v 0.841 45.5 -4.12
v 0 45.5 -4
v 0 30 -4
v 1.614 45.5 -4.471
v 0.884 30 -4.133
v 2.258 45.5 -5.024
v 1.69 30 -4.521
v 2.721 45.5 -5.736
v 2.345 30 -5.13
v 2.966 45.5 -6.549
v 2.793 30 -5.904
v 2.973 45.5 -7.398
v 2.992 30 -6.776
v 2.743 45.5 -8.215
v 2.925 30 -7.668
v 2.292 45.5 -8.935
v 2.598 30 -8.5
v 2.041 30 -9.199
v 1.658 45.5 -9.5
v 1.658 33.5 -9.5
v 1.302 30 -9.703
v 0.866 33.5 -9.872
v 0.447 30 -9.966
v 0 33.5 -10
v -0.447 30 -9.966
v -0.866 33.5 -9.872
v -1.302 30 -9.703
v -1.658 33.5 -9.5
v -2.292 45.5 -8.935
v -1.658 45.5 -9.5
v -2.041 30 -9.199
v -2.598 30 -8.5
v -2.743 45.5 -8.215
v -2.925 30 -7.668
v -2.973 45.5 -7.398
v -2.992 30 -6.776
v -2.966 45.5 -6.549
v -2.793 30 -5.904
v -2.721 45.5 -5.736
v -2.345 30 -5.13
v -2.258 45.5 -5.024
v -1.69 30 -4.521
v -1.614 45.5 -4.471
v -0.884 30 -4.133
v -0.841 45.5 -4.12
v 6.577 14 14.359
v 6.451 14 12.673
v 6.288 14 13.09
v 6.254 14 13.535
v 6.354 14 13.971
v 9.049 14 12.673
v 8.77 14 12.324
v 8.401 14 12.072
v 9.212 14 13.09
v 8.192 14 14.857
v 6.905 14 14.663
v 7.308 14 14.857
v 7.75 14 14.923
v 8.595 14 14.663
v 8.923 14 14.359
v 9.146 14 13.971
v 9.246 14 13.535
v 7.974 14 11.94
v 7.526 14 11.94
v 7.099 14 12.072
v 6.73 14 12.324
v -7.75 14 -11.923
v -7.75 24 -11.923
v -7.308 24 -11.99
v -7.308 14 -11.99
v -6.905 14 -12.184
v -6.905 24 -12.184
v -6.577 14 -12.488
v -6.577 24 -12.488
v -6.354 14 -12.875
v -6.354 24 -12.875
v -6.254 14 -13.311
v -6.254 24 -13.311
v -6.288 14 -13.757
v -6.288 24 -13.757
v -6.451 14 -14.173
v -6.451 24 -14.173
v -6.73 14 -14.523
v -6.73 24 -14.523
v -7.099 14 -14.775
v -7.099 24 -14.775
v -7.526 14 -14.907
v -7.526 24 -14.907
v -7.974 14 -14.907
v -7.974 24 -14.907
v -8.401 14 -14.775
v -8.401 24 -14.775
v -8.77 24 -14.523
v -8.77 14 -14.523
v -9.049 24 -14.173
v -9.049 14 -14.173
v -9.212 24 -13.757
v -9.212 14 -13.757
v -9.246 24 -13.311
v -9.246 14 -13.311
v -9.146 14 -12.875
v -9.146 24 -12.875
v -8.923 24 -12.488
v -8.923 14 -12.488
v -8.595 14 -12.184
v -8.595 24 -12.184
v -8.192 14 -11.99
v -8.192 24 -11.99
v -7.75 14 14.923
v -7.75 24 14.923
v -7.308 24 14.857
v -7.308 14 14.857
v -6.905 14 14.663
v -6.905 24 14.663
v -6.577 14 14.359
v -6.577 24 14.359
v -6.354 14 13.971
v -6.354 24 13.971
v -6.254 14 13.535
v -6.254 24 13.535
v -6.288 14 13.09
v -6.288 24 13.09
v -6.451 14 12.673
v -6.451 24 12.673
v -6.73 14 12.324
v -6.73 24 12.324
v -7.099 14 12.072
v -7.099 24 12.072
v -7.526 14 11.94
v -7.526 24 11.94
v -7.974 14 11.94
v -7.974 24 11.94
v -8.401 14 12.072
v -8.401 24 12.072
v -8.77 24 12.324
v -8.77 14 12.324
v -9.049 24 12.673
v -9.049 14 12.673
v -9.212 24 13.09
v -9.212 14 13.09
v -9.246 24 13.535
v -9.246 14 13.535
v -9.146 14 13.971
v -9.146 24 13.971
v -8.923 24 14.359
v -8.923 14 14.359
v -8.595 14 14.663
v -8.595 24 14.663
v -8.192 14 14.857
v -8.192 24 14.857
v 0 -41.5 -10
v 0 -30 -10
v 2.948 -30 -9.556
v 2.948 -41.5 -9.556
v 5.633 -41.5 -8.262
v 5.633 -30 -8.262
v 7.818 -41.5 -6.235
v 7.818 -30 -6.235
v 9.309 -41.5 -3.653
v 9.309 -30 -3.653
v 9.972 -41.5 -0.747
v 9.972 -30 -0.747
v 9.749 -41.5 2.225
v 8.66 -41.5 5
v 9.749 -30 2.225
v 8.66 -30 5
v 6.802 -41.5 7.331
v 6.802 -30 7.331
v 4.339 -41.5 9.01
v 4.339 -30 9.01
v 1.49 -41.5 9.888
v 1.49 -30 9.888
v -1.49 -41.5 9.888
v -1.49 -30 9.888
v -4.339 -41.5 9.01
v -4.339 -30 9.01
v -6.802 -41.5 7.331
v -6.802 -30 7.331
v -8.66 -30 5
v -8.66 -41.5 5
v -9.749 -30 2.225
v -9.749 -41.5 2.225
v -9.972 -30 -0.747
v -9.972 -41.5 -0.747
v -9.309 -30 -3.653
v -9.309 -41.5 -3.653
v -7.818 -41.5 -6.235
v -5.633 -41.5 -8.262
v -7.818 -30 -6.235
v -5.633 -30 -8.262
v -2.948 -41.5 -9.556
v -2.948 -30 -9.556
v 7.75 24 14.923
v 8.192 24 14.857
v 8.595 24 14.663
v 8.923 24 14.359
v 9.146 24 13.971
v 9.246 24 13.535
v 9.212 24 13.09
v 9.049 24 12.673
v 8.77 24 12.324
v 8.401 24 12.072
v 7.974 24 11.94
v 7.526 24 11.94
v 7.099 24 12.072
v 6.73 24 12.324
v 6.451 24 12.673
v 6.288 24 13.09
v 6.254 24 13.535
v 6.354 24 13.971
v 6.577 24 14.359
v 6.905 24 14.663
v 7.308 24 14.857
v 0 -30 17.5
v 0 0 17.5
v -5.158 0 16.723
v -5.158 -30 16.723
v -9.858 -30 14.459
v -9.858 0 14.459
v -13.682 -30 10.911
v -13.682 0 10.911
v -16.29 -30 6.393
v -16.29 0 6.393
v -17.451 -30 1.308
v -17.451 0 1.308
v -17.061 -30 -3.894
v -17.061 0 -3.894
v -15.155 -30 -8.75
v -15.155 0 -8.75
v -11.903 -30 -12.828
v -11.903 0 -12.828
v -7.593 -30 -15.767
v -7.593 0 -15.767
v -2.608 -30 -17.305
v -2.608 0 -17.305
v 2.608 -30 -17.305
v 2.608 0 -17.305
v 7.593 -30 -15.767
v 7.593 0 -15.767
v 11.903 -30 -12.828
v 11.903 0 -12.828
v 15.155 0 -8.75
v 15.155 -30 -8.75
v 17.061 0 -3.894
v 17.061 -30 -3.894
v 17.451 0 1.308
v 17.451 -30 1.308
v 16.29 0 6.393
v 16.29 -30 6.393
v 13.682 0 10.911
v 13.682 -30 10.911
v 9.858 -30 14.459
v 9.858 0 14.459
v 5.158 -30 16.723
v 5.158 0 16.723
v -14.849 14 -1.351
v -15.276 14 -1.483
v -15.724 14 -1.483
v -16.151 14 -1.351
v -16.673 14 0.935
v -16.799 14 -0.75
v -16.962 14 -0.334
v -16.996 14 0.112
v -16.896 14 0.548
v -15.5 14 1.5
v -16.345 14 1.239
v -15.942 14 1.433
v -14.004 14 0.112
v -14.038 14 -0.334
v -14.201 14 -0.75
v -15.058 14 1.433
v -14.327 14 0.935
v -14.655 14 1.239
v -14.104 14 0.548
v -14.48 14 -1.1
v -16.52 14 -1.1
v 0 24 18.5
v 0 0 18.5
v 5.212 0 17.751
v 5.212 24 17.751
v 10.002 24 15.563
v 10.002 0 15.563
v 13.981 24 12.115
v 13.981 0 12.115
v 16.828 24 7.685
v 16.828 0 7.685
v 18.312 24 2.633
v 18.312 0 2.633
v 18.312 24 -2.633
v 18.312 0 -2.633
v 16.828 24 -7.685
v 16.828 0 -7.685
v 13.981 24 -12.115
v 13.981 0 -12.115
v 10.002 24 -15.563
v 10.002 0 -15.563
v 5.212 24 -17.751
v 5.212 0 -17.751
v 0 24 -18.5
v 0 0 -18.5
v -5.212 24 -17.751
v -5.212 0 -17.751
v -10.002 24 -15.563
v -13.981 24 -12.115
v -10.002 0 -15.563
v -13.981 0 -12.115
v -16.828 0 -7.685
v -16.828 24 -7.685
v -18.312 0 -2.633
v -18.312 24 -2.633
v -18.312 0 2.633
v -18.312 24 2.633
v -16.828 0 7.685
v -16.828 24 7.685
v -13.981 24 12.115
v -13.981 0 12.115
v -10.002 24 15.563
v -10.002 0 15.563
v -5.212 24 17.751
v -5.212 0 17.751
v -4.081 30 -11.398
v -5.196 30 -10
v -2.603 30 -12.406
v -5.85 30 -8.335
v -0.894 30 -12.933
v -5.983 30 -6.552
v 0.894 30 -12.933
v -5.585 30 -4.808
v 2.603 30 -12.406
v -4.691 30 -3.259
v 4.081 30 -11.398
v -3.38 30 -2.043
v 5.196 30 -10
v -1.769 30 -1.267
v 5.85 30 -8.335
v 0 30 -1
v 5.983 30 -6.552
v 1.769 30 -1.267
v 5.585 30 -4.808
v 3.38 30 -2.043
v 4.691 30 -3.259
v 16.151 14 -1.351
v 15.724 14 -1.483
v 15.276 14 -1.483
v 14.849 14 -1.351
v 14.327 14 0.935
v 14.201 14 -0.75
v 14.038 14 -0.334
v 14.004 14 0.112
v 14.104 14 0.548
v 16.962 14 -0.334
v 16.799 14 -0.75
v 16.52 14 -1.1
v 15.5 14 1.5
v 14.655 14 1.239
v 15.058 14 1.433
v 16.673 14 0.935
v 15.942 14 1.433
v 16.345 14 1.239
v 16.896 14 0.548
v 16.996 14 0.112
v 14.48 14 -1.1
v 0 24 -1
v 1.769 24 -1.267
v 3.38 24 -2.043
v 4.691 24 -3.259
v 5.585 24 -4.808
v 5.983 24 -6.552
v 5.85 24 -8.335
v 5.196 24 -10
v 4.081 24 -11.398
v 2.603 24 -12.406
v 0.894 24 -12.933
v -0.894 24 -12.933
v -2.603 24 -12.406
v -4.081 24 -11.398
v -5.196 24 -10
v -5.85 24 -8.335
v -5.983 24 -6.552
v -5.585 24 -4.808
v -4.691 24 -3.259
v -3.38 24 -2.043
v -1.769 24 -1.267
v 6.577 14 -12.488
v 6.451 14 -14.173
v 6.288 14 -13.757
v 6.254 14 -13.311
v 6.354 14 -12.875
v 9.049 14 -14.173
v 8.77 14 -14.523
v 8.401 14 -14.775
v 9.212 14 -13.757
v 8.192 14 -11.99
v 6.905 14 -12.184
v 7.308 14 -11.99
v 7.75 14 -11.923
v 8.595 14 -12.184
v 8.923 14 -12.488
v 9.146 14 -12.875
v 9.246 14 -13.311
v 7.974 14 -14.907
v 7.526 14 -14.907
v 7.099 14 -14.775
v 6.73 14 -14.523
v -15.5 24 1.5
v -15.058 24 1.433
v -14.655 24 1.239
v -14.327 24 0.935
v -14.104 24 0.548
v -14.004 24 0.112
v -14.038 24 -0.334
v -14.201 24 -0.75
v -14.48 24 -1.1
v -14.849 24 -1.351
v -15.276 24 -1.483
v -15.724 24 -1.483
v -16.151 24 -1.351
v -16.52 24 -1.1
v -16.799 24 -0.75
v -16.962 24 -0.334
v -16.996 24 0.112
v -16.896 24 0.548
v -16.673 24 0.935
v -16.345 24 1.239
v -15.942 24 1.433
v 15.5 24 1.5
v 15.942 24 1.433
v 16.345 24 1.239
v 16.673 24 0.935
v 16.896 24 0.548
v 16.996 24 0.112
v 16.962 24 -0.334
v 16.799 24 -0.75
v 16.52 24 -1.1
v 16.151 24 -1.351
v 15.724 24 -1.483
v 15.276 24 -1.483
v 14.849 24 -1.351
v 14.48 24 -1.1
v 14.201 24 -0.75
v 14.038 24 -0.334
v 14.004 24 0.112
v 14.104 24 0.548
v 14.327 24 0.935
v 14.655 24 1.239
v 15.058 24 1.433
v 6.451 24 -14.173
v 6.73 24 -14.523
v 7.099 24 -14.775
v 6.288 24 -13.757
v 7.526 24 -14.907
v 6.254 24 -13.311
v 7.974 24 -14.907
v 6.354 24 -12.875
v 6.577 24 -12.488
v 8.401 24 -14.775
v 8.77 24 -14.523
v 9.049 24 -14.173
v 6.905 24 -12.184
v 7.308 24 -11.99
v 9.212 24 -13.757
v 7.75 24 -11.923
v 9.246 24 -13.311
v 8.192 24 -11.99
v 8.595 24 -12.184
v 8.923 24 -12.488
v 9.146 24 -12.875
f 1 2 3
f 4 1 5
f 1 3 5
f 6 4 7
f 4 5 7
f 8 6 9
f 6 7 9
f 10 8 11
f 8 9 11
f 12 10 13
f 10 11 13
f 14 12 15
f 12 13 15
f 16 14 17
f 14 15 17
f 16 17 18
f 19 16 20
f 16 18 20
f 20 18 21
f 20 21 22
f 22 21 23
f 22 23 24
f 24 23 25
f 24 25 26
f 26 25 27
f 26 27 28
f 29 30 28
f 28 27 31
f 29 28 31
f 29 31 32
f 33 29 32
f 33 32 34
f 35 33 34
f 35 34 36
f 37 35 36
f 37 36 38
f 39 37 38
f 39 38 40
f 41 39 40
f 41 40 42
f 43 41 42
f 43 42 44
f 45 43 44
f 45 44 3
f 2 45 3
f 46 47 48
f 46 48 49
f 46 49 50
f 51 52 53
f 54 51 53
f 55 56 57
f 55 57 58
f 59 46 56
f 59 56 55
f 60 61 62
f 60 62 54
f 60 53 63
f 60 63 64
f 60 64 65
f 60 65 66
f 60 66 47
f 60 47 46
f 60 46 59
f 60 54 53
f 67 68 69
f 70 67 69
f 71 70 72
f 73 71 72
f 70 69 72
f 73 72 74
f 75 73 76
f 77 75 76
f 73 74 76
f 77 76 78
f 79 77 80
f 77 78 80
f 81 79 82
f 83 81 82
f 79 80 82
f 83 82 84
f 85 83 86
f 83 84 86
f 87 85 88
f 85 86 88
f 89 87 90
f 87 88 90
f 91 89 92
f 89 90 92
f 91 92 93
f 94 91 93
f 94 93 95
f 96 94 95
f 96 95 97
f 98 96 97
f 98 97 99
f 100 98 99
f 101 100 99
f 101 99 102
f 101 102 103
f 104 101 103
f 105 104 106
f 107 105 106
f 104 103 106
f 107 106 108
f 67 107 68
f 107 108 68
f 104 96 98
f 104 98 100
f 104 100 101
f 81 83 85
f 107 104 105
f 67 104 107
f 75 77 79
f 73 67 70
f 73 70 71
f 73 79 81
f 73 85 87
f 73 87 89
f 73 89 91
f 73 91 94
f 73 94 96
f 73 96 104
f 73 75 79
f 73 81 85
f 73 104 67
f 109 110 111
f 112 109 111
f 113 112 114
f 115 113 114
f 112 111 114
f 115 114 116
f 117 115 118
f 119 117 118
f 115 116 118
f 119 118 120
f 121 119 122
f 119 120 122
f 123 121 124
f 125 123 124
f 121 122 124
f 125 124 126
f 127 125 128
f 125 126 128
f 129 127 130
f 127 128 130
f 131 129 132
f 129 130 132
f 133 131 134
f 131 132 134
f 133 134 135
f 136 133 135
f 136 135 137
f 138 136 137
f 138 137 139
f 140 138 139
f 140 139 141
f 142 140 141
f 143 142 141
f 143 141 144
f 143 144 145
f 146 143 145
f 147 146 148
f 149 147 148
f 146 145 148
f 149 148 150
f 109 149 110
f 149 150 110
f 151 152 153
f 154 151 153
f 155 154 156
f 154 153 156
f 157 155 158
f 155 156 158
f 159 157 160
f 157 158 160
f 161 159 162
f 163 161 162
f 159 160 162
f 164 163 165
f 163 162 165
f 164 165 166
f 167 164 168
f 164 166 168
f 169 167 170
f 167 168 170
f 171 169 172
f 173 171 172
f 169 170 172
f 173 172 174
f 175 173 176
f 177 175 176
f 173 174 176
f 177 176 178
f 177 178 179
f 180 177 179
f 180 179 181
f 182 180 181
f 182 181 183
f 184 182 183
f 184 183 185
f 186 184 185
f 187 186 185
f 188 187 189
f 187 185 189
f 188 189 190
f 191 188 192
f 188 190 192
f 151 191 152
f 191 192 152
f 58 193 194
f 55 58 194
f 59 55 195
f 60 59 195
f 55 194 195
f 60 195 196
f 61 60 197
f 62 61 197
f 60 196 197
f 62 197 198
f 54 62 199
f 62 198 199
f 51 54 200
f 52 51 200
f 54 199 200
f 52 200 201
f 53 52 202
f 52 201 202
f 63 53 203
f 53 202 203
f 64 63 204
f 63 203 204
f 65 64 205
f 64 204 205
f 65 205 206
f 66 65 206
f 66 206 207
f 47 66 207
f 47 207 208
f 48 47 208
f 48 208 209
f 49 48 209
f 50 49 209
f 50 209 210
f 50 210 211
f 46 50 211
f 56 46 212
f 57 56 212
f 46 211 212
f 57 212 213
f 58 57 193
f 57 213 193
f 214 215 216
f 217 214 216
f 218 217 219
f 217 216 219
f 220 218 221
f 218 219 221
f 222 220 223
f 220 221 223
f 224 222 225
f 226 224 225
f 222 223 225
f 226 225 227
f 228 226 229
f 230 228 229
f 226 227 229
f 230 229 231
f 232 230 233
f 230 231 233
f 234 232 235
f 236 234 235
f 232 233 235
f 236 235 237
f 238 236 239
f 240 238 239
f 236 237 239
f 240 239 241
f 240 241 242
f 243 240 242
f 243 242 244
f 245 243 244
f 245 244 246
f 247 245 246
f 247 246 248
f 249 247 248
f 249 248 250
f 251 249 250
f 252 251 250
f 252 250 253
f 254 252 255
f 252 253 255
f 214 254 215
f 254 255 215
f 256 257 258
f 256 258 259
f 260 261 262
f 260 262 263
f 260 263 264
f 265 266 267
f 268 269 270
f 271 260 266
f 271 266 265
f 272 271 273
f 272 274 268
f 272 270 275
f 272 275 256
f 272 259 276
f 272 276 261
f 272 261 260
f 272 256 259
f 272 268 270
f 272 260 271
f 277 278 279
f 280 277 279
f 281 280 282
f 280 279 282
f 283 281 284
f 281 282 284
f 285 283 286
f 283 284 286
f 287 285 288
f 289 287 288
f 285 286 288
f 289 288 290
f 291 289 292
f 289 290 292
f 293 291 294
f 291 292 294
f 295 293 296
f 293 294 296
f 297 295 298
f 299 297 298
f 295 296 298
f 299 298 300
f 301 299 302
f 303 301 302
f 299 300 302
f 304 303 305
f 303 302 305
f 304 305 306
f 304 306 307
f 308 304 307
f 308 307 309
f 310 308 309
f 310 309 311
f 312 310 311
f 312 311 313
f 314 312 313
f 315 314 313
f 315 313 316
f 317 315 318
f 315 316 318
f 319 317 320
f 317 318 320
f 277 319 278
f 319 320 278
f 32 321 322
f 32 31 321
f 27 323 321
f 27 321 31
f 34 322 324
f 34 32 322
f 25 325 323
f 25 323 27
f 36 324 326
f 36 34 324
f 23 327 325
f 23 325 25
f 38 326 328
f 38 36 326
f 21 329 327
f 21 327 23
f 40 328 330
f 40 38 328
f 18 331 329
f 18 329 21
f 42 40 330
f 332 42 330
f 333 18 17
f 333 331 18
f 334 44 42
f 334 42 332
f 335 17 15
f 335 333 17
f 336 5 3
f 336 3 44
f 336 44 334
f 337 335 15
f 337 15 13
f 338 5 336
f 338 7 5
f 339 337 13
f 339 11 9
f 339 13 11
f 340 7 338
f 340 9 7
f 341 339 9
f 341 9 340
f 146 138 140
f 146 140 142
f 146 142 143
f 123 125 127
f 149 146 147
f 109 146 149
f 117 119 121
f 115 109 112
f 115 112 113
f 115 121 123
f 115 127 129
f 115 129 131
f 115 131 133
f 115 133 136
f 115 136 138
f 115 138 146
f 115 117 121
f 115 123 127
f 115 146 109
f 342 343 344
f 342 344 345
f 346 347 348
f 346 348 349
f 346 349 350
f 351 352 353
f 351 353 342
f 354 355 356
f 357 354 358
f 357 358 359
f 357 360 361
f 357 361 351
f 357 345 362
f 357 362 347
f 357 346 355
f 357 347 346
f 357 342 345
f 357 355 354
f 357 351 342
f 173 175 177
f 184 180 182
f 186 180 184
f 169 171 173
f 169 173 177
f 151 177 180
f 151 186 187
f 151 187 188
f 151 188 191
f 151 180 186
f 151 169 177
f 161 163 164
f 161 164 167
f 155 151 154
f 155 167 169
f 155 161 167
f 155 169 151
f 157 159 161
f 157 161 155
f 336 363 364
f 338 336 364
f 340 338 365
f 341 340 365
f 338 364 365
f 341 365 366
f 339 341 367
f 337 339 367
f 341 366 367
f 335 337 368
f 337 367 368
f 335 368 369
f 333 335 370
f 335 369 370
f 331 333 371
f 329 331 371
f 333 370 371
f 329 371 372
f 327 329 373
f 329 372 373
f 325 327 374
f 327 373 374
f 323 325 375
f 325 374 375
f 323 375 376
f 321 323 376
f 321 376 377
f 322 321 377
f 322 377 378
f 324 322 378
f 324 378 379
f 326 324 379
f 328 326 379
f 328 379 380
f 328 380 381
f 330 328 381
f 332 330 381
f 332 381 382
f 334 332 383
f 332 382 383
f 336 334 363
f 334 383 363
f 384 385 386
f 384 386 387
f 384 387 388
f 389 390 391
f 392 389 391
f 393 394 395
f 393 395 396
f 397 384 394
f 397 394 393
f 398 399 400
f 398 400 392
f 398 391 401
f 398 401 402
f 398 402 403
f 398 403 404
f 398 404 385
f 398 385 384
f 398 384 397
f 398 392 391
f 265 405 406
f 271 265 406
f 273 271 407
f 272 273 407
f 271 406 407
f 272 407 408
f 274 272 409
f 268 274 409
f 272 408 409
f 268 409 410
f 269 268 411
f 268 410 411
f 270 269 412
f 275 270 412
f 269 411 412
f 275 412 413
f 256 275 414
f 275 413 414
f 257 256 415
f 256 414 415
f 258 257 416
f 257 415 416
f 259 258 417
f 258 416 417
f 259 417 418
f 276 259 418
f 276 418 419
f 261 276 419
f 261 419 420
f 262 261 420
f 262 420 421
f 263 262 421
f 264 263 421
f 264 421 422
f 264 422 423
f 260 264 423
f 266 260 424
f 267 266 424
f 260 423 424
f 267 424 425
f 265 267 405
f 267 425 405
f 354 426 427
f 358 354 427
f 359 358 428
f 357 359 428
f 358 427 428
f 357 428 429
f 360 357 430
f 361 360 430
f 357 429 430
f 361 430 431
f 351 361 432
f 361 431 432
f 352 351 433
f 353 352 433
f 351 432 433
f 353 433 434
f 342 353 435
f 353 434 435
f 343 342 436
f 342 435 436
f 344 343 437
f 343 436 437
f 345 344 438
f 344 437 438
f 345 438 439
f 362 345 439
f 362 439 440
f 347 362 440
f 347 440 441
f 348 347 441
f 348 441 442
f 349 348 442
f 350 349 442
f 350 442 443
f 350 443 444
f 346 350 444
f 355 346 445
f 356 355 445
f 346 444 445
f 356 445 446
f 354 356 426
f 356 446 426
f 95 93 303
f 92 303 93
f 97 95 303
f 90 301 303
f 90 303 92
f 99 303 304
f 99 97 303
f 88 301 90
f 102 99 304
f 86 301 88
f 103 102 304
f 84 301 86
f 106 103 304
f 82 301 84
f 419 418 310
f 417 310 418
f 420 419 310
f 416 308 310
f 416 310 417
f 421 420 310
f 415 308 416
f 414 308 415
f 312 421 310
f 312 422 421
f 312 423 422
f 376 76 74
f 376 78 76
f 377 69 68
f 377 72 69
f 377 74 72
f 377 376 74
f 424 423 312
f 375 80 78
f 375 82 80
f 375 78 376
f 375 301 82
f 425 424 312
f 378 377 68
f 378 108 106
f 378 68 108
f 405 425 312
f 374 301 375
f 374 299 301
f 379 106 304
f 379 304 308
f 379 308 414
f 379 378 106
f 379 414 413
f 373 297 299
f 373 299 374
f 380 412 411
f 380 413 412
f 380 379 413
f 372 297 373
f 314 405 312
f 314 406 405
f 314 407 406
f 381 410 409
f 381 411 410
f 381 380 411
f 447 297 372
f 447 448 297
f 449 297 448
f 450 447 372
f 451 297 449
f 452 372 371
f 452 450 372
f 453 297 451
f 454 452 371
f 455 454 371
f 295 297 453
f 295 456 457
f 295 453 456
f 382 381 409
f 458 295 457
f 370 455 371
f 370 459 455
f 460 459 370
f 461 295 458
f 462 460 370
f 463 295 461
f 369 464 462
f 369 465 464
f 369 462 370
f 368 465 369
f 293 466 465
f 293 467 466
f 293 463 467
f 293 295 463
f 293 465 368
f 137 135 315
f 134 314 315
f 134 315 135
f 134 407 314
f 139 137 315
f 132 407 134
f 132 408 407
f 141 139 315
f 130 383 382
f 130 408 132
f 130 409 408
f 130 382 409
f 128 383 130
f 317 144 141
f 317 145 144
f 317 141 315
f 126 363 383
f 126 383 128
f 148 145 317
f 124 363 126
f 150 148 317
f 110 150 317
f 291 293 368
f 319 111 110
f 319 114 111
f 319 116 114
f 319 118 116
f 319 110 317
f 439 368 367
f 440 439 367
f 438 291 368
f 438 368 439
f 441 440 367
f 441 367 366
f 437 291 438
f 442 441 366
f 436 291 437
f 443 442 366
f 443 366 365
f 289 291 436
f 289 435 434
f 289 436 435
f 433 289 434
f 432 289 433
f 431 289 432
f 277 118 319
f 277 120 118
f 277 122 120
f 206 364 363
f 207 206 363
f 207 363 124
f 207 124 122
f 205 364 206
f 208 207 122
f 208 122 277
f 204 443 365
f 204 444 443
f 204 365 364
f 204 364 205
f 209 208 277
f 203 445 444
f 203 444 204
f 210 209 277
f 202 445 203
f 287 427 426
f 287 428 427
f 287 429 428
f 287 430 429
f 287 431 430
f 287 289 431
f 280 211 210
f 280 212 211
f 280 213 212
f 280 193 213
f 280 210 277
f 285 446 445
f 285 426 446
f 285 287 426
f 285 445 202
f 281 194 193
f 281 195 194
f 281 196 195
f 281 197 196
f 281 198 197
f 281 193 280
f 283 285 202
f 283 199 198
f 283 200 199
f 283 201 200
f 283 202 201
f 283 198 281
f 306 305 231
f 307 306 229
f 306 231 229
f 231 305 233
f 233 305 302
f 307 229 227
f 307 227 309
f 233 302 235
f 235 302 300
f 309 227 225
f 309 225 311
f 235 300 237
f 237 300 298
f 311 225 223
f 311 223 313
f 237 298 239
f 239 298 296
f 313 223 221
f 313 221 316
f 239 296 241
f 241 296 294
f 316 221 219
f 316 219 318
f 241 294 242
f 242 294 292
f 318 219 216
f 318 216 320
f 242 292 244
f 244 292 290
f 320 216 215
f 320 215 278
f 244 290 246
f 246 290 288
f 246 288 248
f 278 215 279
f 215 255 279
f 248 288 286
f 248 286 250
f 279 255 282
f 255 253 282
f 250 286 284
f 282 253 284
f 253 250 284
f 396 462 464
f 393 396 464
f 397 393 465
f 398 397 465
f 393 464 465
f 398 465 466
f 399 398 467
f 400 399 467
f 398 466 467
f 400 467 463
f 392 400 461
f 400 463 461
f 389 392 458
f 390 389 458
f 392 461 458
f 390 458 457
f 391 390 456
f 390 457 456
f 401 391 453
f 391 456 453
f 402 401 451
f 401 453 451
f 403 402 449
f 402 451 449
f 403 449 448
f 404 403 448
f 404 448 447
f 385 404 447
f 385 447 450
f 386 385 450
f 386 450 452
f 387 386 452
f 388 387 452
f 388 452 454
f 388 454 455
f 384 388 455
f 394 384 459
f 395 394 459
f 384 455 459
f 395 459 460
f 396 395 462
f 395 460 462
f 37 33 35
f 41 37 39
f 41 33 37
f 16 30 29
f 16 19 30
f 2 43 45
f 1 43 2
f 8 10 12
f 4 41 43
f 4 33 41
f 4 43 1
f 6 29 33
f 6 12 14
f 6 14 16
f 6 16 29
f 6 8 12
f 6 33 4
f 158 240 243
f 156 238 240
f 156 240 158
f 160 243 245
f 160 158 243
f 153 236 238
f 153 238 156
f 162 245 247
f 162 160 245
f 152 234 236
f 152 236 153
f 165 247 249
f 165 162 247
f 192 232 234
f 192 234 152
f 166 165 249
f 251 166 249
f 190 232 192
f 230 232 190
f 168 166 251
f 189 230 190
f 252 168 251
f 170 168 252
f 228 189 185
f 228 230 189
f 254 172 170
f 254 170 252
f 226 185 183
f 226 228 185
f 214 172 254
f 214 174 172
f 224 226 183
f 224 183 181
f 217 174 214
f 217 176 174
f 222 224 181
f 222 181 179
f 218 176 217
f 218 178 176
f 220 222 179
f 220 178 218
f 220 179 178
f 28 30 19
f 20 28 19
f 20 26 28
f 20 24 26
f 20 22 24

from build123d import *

# Parameters (mm, degrees)
SKETCH_1_R          = 18.5
EXTRUDE_1_DEPTH     = 24
SKETCH_2_R          = 6
EXTRUDE_2_DEPTH     = 6
SKETCH_3_R          = 3
EXTRUDE_3_DEPTH     = 15.5
SKETCH_4_R          = 17.5
EXTRUDE_4_DEPTH     = 30
SKETCH_5_R          = 10
EXTRUDE_6_DEPTH     = 11.5
CUT_EXTRUDE_1_DEPTH = 12
SKETCH_7_R          = 1.5
CUT_EXTRUDE_2_DEPTH = 10


with BuildPart() as part:
    # 草图1 → 凸台-拉伸1 (new body)
    with BuildSketch(Plane(origin=(0, 0, 0), x_dir=(1, 0, 0), z_dir=(0, 1, 0))):
        with Locations(Location((0, 0, 0), (0, 0, 270))):
            Circle(SKETCH_1_R)
    extrude(amount=EXTRUDE_1_DEPTH)

    # 草图2 → 凸台-拉伸2 (add)
    with BuildSketch(Plane(origin=(0, 24, 0), x_dir=(1, 0, 0), z_dir=(0, 1, 0))):
        with Locations(Location((0, 7, 0), (0, 0, 270))):
            Circle(SKETCH_2_R)
    extrude(amount=EXTRUDE_2_DEPTH)

    # 草图3 → 凸台-拉伸3 (add)
    with BuildSketch(Plane(origin=(0, 30, 0), x_dir=(1, 0, 0), z_dir=(0, 1, 0))):
        with Locations(Location((0, 7, 0), (0, 0, 270))):
            Circle(SKETCH_3_R)
    extrude(amount=EXTRUDE_3_DEPTH)

    # 草图4 → 凸台-拉伸4 (add)
    with BuildSketch(Plane.XZ):
        with Locations(Location((0, 0, 0), (0, 0, 90))):
            Circle(SKETCH_4_R)
    extrude(amount=EXTRUDE_4_DEPTH)

    # 草图5 → 凸台-拉伸6 (add)
    with BuildSketch(Plane.XZ.offset(30)):
        with Locations(Location((0, 0, 0), (0, 0, 270))):
            Circle(SKETCH_5_R)
    extrude(amount=EXTRUDE_6_DEPTH)

    # 草图6 → 切除-拉伸1 (cut)
    with BuildSketch(Plane(origin=(0, 45.5, 0), x_dir=(1, 0, 0), z_dir=(0, 1, 0))):
        with BuildLine():
            Line((-3.711279789, 9.5), (4.099560016, 9.5))
            ThreePointArc((4.099560016, 9.5), (0.194140114, 13.405419903), (-3.711279789, 9.5))
        make_face()
    extrude(amount=-CUT_EXTRUDE_1_DEPTH, mode=Mode.SUBTRACT)

    # 草图7 → 切除-拉伸2 (cut)
    with BuildSketch(Plane(origin=(0, 24, 0), x_dir=(1, 0, 0), z_dir=(0, 1, 0))):
        with Locations(Location((-15.5, 0, 0), (0, 0, 270))):
            Circle(SKETCH_7_R)
        with Locations(Location((-7.75, 13.423393759, 0), (0, 0, 270))):
            Circle(SKETCH_7_R)
        with Locations(Location((7.75, 13.423393759, 0), (0, 0, 270))):
            Circle(SKETCH_7_R)
        with Locations(Location((15.5, 0, 0), (0, 0, 270))):
            Circle(SKETCH_7_R)
        with Locations(Location((7.75, -13.423393759, 0), (0, 0, 270))):
            Circle(SKETCH_7_R)
        with Locations(Location((-7.75, -13.423393759, 0), (0, 0, 270))):
            Circle(SKETCH_7_R)
    extrude(amount=-CUT_EXTRUDE_2_DEPTH, mode=Mode.SUBTRACT)


solid = part.part
